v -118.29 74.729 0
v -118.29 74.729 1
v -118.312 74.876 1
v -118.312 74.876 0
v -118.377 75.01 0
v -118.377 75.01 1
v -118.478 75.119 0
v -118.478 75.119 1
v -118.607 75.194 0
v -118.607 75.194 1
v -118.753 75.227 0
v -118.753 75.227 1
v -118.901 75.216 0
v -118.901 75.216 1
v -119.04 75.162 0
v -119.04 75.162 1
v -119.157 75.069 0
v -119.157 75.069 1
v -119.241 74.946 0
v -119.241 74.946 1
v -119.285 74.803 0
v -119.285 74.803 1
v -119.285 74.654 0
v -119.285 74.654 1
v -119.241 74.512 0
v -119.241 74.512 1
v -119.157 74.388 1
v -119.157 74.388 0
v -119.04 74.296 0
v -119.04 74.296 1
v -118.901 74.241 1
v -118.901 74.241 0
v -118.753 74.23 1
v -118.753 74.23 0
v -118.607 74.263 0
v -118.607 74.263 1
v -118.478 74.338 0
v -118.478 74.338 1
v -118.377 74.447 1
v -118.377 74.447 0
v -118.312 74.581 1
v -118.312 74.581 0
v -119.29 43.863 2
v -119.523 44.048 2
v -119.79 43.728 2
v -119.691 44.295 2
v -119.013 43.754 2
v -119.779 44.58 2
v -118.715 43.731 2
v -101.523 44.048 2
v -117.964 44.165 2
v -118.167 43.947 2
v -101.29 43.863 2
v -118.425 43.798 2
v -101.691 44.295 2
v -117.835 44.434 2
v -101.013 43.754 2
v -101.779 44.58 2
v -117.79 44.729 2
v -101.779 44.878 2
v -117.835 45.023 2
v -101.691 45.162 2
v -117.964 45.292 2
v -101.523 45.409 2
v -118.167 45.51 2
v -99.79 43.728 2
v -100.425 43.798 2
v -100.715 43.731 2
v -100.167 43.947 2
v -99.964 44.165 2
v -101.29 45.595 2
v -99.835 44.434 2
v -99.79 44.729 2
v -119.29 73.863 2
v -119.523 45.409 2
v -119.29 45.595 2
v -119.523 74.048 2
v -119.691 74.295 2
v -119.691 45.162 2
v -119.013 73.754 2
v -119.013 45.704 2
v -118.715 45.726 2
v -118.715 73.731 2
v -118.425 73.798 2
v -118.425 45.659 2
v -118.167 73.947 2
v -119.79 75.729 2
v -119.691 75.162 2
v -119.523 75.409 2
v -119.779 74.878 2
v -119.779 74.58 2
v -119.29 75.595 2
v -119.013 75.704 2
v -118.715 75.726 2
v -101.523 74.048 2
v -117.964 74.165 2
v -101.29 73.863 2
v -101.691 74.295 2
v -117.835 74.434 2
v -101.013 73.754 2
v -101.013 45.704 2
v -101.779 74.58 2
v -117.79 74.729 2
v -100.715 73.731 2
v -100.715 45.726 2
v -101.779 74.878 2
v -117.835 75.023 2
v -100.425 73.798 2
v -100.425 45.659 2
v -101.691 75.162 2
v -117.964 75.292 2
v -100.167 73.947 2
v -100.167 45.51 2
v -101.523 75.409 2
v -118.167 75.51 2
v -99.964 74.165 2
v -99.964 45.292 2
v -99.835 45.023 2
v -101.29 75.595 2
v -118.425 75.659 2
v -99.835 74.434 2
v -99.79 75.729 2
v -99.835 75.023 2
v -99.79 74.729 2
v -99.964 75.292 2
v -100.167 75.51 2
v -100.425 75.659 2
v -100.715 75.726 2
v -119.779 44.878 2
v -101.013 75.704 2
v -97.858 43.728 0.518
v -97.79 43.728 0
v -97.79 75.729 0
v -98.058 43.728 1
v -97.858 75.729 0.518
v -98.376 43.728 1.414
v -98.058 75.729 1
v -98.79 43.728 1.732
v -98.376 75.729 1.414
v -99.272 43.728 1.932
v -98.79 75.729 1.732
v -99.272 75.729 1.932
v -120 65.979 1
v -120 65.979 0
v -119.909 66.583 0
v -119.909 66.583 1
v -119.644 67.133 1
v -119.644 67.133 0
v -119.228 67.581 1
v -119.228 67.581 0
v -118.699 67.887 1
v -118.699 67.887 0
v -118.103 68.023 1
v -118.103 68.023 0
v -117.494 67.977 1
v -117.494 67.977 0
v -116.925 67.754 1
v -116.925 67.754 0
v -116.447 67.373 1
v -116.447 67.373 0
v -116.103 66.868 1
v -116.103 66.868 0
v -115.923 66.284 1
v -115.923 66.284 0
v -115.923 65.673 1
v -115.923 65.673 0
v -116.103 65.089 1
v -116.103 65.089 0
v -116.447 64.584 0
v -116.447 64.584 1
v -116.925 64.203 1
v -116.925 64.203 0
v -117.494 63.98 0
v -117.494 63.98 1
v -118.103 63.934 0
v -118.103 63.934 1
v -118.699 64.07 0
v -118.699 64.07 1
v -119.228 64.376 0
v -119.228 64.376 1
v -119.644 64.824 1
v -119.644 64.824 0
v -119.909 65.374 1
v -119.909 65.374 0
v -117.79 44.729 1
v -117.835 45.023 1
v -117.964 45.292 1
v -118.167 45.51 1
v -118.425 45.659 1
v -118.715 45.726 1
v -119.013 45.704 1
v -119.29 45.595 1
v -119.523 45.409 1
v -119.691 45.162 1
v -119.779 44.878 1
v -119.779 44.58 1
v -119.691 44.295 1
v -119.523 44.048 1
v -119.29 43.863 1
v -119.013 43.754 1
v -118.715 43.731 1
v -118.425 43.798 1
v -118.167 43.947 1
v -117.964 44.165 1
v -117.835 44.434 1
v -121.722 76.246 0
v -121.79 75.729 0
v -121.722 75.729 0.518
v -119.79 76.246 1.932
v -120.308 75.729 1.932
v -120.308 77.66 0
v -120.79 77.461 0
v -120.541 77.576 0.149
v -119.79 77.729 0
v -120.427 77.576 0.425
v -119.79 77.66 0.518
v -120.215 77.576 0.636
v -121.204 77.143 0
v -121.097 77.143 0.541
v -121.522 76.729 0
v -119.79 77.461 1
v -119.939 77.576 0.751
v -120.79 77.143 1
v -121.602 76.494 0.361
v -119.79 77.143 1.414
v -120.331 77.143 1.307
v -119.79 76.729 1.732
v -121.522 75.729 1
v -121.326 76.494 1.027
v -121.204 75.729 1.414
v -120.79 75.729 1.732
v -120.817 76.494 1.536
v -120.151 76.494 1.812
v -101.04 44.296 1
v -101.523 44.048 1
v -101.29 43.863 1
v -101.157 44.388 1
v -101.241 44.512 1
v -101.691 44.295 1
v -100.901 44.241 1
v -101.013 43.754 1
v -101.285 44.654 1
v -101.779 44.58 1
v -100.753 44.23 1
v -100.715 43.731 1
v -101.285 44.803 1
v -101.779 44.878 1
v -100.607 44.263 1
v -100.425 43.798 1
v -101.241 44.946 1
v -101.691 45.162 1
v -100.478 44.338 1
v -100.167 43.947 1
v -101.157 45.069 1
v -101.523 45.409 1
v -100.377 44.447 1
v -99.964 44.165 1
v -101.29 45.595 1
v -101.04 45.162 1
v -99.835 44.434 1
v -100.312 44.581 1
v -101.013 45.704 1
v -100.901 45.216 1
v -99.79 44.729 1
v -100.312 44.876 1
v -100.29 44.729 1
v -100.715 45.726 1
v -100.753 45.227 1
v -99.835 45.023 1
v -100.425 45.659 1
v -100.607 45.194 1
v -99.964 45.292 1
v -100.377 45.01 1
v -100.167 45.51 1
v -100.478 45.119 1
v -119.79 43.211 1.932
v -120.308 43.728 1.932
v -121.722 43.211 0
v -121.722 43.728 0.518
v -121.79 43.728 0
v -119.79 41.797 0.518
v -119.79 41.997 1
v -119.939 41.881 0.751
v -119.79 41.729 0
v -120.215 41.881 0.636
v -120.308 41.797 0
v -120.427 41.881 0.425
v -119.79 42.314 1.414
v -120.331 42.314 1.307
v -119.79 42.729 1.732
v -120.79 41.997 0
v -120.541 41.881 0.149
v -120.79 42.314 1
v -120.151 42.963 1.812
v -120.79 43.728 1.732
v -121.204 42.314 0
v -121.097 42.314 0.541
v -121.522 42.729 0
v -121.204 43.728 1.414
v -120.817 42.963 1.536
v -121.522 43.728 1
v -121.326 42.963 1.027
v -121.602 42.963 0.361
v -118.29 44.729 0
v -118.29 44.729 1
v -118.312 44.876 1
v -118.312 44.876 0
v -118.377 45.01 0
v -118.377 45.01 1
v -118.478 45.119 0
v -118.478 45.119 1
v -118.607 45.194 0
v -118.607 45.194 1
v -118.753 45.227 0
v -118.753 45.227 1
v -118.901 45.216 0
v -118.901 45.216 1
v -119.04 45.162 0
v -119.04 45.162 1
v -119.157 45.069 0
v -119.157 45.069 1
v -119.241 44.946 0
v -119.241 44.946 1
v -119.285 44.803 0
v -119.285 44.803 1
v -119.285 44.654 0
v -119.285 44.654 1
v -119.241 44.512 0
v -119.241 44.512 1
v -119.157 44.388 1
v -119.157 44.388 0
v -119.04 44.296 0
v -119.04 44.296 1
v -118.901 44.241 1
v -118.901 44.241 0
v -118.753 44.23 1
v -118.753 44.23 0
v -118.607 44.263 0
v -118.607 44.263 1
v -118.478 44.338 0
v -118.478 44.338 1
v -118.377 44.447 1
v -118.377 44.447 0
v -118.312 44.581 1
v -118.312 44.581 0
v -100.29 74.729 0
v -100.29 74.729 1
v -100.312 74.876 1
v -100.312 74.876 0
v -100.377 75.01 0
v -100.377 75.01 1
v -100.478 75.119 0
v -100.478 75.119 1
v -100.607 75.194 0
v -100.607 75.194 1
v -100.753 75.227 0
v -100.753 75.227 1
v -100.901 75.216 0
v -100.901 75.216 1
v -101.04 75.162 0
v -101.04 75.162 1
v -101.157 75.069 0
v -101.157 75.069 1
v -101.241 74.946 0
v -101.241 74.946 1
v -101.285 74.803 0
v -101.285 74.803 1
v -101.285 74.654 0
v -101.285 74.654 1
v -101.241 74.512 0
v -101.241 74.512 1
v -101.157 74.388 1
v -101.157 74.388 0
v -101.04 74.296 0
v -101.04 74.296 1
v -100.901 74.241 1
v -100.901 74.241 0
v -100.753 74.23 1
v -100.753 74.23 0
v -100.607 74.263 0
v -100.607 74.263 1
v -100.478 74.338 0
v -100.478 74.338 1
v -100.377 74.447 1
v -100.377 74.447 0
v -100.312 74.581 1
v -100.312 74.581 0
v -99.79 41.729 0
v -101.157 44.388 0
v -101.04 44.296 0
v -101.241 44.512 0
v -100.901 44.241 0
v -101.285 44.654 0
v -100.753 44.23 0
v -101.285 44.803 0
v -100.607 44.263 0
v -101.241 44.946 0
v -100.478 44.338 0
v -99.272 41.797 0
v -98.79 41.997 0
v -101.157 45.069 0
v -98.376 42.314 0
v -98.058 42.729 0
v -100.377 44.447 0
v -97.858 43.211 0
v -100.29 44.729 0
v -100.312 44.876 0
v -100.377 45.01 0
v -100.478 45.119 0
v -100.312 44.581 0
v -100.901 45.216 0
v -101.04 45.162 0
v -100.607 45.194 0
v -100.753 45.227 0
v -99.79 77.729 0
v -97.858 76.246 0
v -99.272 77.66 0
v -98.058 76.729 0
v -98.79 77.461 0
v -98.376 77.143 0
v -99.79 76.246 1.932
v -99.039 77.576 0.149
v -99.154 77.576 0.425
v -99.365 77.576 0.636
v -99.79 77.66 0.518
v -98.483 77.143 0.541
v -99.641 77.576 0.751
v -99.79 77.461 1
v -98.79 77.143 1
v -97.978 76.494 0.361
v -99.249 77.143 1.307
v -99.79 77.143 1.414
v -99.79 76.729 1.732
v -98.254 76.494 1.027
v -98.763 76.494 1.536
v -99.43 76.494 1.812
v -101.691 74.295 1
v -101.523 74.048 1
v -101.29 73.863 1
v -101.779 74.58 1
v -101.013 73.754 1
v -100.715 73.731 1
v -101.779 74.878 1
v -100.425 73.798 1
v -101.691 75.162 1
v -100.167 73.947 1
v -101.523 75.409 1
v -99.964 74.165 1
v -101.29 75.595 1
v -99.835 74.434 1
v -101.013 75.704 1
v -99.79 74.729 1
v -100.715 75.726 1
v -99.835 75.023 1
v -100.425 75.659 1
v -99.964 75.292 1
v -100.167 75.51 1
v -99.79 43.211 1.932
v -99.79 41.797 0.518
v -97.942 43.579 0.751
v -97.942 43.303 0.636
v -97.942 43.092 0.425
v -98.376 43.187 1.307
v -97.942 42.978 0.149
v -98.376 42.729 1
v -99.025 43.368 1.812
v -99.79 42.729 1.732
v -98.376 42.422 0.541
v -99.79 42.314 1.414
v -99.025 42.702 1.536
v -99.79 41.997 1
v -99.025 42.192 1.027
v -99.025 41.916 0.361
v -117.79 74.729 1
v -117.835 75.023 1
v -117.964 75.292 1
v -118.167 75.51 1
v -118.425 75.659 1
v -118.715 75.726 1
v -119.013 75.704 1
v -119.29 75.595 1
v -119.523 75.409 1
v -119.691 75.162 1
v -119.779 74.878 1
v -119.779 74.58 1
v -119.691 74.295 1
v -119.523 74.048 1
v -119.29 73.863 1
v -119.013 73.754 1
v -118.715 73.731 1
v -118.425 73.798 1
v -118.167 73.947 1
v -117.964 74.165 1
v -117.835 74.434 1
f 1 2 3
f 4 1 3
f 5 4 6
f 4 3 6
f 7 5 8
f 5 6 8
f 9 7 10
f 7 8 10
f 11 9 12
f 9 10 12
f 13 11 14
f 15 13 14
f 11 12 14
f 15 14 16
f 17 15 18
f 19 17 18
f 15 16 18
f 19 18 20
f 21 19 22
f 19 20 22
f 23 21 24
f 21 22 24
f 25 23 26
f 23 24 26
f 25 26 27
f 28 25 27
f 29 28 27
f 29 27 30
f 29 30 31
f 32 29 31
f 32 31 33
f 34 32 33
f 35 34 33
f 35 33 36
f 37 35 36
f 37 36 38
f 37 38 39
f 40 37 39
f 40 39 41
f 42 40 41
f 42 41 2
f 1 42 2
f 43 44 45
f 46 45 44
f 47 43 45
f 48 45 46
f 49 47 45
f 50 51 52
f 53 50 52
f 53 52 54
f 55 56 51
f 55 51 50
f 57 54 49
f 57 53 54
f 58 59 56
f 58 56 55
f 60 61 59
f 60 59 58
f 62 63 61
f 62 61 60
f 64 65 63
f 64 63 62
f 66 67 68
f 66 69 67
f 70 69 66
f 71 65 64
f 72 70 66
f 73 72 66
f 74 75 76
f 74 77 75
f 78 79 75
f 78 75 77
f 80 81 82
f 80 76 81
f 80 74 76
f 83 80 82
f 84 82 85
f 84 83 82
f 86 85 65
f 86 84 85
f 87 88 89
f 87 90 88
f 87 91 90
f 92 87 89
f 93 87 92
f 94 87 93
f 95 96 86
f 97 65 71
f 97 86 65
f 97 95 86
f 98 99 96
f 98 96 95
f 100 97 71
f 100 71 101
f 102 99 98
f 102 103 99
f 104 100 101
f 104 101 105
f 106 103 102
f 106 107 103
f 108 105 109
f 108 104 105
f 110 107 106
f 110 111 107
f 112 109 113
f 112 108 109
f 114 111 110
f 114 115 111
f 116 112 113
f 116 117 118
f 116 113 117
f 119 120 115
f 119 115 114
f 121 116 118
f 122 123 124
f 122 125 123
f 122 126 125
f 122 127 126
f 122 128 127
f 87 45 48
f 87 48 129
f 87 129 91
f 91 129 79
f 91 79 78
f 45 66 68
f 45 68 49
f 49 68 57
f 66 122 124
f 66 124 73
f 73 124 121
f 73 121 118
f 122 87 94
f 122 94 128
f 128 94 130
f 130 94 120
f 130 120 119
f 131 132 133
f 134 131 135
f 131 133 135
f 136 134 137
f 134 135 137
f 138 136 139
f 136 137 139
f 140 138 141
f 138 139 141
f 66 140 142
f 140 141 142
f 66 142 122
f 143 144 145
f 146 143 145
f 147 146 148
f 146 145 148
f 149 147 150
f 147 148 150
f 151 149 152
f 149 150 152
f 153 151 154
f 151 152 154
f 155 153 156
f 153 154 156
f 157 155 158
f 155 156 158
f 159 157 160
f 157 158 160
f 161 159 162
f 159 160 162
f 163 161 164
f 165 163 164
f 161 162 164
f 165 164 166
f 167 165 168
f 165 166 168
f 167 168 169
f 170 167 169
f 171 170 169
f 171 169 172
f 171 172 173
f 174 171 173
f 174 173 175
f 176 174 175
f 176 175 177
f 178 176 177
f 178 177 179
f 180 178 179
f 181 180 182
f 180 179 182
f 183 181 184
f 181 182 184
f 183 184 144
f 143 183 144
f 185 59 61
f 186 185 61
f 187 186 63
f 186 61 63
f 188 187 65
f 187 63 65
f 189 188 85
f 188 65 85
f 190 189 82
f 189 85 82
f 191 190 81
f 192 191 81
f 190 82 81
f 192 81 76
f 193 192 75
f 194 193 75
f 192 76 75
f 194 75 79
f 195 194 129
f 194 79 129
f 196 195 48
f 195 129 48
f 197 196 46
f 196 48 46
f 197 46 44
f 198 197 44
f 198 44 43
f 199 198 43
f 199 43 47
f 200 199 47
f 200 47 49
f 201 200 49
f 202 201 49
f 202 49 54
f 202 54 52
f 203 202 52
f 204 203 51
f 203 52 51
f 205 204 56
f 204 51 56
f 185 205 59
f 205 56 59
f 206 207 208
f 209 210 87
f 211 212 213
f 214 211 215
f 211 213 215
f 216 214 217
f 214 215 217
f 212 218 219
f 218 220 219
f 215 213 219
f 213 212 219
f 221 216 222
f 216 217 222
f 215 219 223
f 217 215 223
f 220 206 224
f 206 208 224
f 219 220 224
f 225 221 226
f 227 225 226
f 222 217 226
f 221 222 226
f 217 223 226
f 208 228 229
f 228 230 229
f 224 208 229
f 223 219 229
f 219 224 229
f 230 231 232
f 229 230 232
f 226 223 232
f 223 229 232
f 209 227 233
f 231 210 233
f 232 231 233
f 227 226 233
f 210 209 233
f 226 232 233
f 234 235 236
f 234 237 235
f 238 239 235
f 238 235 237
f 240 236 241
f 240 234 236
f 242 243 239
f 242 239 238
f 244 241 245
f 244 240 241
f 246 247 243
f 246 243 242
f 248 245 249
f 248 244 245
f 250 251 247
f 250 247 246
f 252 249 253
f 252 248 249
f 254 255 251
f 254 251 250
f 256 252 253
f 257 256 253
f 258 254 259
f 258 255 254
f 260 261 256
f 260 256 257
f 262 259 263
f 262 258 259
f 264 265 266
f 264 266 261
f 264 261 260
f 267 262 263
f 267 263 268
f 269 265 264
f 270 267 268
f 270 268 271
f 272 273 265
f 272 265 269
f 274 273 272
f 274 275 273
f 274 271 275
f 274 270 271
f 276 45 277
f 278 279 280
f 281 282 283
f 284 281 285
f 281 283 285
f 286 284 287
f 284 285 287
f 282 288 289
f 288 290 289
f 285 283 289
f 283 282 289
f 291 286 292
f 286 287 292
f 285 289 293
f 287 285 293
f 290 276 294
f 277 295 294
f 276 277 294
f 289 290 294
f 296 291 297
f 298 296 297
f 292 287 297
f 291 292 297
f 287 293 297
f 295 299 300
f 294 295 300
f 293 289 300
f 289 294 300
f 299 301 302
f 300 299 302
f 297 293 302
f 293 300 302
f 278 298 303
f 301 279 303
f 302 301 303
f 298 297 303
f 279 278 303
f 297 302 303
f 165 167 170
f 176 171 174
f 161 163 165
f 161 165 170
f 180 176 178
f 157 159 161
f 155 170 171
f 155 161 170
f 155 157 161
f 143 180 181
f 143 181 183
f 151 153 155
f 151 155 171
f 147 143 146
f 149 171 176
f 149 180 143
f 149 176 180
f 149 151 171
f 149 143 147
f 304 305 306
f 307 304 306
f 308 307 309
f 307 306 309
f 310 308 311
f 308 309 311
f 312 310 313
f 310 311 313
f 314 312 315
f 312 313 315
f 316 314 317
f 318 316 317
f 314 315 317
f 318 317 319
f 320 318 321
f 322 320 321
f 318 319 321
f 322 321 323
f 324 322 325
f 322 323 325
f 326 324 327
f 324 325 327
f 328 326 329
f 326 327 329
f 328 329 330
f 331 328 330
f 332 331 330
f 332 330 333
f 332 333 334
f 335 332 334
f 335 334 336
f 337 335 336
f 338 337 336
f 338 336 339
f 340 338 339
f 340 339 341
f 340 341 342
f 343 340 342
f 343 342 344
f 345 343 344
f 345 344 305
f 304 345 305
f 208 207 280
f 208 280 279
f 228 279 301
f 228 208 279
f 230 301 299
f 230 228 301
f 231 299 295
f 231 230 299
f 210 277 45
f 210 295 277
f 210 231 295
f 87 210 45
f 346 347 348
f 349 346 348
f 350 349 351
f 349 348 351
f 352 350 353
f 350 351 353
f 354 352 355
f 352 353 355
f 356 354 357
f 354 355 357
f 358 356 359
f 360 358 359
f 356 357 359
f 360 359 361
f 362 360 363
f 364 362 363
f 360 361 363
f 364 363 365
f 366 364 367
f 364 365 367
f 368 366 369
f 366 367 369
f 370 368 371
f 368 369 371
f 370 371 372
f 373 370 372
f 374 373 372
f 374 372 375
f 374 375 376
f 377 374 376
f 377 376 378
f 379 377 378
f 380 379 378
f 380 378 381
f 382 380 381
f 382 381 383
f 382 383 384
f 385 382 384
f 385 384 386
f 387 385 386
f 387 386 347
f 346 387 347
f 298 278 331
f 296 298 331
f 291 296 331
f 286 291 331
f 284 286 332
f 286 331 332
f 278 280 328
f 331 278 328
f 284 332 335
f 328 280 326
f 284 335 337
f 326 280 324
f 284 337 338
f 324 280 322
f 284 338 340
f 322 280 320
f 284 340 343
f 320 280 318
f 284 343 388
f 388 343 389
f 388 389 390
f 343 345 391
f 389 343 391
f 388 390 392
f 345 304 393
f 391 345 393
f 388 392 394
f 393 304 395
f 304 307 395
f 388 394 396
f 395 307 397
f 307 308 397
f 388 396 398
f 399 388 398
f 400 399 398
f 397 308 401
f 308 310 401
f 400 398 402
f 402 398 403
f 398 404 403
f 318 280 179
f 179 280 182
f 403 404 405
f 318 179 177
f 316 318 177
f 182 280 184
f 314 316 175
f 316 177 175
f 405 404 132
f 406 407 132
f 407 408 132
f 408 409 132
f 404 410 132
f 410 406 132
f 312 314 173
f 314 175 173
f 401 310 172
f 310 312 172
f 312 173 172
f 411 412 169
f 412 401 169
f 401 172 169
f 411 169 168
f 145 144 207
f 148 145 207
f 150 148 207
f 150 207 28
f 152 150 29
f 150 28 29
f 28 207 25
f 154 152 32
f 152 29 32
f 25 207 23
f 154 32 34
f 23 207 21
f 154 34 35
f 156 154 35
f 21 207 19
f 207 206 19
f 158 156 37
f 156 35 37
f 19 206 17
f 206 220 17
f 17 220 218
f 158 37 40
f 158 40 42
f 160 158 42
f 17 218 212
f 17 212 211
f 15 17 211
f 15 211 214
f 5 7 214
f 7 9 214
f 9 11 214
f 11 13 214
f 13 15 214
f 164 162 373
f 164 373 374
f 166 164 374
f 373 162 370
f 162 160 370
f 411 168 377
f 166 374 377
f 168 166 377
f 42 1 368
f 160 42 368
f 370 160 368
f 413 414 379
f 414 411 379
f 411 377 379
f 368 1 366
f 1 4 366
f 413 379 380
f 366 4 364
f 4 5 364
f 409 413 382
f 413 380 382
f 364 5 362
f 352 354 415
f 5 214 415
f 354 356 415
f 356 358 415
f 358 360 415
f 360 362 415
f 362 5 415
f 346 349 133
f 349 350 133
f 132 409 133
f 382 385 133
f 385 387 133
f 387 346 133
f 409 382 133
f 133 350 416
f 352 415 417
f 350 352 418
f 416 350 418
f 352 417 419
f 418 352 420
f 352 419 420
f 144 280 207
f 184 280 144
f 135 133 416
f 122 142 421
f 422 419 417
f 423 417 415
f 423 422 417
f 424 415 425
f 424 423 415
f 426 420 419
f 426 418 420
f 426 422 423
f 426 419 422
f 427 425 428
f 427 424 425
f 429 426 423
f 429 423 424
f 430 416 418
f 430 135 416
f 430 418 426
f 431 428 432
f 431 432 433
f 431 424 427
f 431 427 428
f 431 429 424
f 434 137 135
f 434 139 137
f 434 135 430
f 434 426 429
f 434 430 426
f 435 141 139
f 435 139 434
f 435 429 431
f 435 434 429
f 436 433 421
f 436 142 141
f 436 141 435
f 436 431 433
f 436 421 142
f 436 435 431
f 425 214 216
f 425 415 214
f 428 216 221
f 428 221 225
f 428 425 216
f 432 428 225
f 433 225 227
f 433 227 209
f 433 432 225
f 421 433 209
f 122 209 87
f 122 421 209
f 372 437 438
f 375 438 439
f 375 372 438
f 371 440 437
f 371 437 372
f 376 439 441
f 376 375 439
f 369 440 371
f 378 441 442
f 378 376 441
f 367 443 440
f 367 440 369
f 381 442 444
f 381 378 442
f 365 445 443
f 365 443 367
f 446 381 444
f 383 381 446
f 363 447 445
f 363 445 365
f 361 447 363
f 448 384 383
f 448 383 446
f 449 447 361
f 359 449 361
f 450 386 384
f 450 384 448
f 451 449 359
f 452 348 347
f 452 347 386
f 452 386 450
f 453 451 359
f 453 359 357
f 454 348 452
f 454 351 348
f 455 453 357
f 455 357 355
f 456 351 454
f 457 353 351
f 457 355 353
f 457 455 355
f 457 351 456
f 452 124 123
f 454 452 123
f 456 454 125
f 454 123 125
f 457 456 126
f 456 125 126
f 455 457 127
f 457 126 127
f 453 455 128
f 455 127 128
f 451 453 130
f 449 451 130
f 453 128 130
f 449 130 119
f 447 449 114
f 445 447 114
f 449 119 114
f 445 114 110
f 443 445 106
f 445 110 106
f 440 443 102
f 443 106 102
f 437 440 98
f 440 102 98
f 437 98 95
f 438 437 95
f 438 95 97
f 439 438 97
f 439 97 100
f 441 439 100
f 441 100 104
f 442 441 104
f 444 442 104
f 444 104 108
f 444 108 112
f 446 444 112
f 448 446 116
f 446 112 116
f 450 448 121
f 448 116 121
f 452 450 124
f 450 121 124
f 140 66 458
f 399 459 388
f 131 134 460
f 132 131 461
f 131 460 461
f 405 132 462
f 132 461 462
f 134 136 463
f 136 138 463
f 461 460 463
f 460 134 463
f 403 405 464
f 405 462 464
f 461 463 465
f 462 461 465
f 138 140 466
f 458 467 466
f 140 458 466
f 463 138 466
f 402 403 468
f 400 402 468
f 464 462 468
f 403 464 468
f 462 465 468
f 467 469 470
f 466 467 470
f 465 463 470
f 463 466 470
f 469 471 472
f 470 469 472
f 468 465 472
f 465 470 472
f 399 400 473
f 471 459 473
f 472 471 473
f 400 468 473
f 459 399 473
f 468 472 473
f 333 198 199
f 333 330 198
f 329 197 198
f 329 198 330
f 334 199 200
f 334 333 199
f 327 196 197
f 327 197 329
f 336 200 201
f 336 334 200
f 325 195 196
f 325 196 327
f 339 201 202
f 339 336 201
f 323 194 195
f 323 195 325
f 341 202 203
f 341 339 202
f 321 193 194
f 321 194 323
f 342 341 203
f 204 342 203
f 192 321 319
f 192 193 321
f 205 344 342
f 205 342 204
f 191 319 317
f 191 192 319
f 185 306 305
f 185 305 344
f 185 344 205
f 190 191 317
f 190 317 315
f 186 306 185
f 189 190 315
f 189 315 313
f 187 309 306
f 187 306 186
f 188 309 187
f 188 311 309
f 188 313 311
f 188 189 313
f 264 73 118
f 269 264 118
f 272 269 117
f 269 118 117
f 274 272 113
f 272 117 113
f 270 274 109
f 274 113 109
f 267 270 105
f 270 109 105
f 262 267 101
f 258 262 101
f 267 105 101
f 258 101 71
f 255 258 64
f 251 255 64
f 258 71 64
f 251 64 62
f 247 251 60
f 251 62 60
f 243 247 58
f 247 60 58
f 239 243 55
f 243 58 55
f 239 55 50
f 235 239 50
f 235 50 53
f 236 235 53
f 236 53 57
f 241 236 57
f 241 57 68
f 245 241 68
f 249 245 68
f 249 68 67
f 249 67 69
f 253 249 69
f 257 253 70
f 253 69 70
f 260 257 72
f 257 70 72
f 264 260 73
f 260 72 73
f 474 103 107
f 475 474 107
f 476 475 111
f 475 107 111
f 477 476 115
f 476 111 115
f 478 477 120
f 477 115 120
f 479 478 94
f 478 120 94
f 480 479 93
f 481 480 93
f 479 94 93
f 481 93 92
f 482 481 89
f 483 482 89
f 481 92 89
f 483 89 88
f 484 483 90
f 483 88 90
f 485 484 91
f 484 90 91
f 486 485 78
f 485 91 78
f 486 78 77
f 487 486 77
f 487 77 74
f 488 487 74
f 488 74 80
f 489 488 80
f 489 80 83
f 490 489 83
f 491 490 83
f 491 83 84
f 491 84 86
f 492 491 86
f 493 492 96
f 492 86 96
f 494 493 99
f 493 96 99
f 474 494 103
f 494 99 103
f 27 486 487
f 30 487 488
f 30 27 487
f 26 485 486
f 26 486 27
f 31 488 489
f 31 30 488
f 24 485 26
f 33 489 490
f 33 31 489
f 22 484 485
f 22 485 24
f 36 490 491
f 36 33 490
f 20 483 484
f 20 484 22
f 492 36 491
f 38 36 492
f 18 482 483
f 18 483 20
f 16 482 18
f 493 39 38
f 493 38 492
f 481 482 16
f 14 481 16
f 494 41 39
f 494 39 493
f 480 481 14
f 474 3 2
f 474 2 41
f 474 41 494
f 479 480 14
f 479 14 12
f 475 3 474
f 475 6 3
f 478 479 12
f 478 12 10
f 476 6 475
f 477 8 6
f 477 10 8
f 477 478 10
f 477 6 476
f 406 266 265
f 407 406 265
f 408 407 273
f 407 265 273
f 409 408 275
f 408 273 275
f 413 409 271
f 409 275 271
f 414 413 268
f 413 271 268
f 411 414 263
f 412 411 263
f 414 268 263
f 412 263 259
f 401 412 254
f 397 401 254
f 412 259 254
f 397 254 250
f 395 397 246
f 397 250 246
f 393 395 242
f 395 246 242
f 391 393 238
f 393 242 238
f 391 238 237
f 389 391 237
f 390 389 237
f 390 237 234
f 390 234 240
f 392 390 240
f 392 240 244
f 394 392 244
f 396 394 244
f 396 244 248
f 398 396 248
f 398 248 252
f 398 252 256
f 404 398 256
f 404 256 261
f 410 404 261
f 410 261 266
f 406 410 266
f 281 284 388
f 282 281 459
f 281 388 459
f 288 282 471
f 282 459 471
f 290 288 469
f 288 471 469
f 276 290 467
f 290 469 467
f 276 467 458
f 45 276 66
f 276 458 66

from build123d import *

# Parameters (mm, degrees)
SKETCH_1_W          = 24
SKETCH_1_H          = 36
EXTRUDE_1_DEPTH     = 2
FILLET_1_R          = 2
SKETCH_4_R          = 2.05
CUT_EXTRUDE_1_DEPTH = 1
SKETCH_9_R          = 1
CUT_EXTRUDE_3_DEPTH = 1
CUT_EXTRUDE_4_REACH = 146.484
SKETCH_10_R         = 0.5


with BuildPart() as part:
    # 草图1 → 凸台-拉伸1 (new body)
    with BuildSketch(Plane.XY):
        with Locations((-109.790086771, 59.72858385)):
            Rectangle(SKETCH_1_W, SKETCH_1_H)
    extrude(amount=EXTRUDE_1_DEPTH)

    # 圆角1
    fillet_1_edges = [part.edges().sort_by_distance(p)[0] for p in [
        (-121.790086771, 59.72858385, 2),
        (-109.790086771, 41.72858385, 2),
        (-97.790086771, 59.72858385, 2),
        (-97.790086771, 41.72858385, 1),
        (-121.790086771, 41.72858385, 1),
        (-121.790086771, 77.72858385, 1),
        (-97.790086771, 77.72858385, 1),
        (-109.790086771, 77.72858385, 2),
    ]]
    fillet(fillet_1_edges, radius=FILLET_1_R - 0.0001)  # a hair under: the kernel refuses the full size

    # 草图4 → 切除-拉伸1 (cut)
    with BuildSketch(Plane(origin=(0, 0, 0), x_dir=(-1, 0, 0), z_dir=(0, 0, -1))):
        with Locations((117.950086771, 65.97858385)):
            Circle(SKETCH_4_R)
    extrude(amount=-CUT_EXTRUDE_1_DEPTH, mode=Mode.SUBTRACT)

    # 草图9 → 切除-拉伸3 (cut)
    with BuildSketch(Plane.XY.offset(2)):
        with Locations((-100.790086771, 74.72858385)):
            Circle(SKETCH_9_R)
        with Locations((-100.790086771, 44.72858385)):
            Circle(SKETCH_9_R)
        with Locations((-118.790086771, 44.72858385)):
            Circle(SKETCH_9_R)
        with Locations((-118.790086771, 74.72858385)):
            Circle(SKETCH_9_R)
    extrude(amount=-CUT_EXTRUDE_3_DEPTH, mode=Mode.SUBTRACT)

    # 草图10 → 切除-拉伸4 (cut, up to next)
    with BuildSketch(Plane.XY.offset(1), mode=Mode.PRIVATE) as cut_extrude_4_sk1:
        with Locations((-118.790086771, 44.72858385)):
            Circle(SKETCH_10_R)
    cut_extrude_4_tool1 = extrude(cut_extrude_4_sk1.sketch, amount=-CUT_EXTRUDE_4_REACH, mode=Mode.PRIVATE) & part.part
    # 草图10 → 切除-拉伸4 (cut, up to next)
    with BuildSketch(Plane.XY.offset(1), mode=Mode.PRIVATE) as cut_extrude_4_sk2:
        with Locations((-100.790086771, 44.72858385)):
            Circle(SKETCH_10_R)
    cut_extrude_4_tool2 = extrude(cut_extrude_4_sk2.sketch, amount=-CUT_EXTRUDE_4_REACH, mode=Mode.PRIVATE) & part.part
    # 草图10 → 切除-拉伸4 (cut, up to next)
    with BuildSketch(Plane.XY.offset(1), mode=Mode.PRIVATE) as cut_extrude_4_sk3:
        with Locations((-100.790086771, 74.72858385)):
            Circle(SKETCH_10_R)
    cut_extrude_4_tool3 = extrude(cut_extrude_4_sk3.sketch, amount=-CUT_EXTRUDE_4_REACH, mode=Mode.PRIVATE) & part.part
    # 草图10 → 切除-拉伸4 (cut, up to next)
    with BuildSketch(Plane.XY.offset(1), mode=Mode.PRIVATE) as cut_extrude_4_sk4:
        with Locations((-118.790086771, 74.72858385)):
            Circle(SKETCH_10_R)
    cut_extrude_4_tool4 = extrude(cut_extrude_4_sk4.sketch, amount=-CUT_EXTRUDE_4_REACH, mode=Mode.PRIVATE) & part.part
    add(cut_extrude_4_tool1.solids().sort_by_distance((-118.790087, 44.728584, 1))[0], mode=Mode.SUBTRACT)
    add(cut_extrude_4_tool2.solids().sort_by_distance((-100.790087, 44.728584, 1))[0], mode=Mode.SUBTRACT)
    add(cut_extrude_4_tool3.solids().sort_by_distance((-100.790087, 74.728584, 1))[0], mode=Mode.SUBTRACT)
    add(cut_extrude_4_tool4.solids().sort_by_distance((-118.790087, 74.728584, 1))[0], mode=Mode.SUBTRACT)


solid = part.part
